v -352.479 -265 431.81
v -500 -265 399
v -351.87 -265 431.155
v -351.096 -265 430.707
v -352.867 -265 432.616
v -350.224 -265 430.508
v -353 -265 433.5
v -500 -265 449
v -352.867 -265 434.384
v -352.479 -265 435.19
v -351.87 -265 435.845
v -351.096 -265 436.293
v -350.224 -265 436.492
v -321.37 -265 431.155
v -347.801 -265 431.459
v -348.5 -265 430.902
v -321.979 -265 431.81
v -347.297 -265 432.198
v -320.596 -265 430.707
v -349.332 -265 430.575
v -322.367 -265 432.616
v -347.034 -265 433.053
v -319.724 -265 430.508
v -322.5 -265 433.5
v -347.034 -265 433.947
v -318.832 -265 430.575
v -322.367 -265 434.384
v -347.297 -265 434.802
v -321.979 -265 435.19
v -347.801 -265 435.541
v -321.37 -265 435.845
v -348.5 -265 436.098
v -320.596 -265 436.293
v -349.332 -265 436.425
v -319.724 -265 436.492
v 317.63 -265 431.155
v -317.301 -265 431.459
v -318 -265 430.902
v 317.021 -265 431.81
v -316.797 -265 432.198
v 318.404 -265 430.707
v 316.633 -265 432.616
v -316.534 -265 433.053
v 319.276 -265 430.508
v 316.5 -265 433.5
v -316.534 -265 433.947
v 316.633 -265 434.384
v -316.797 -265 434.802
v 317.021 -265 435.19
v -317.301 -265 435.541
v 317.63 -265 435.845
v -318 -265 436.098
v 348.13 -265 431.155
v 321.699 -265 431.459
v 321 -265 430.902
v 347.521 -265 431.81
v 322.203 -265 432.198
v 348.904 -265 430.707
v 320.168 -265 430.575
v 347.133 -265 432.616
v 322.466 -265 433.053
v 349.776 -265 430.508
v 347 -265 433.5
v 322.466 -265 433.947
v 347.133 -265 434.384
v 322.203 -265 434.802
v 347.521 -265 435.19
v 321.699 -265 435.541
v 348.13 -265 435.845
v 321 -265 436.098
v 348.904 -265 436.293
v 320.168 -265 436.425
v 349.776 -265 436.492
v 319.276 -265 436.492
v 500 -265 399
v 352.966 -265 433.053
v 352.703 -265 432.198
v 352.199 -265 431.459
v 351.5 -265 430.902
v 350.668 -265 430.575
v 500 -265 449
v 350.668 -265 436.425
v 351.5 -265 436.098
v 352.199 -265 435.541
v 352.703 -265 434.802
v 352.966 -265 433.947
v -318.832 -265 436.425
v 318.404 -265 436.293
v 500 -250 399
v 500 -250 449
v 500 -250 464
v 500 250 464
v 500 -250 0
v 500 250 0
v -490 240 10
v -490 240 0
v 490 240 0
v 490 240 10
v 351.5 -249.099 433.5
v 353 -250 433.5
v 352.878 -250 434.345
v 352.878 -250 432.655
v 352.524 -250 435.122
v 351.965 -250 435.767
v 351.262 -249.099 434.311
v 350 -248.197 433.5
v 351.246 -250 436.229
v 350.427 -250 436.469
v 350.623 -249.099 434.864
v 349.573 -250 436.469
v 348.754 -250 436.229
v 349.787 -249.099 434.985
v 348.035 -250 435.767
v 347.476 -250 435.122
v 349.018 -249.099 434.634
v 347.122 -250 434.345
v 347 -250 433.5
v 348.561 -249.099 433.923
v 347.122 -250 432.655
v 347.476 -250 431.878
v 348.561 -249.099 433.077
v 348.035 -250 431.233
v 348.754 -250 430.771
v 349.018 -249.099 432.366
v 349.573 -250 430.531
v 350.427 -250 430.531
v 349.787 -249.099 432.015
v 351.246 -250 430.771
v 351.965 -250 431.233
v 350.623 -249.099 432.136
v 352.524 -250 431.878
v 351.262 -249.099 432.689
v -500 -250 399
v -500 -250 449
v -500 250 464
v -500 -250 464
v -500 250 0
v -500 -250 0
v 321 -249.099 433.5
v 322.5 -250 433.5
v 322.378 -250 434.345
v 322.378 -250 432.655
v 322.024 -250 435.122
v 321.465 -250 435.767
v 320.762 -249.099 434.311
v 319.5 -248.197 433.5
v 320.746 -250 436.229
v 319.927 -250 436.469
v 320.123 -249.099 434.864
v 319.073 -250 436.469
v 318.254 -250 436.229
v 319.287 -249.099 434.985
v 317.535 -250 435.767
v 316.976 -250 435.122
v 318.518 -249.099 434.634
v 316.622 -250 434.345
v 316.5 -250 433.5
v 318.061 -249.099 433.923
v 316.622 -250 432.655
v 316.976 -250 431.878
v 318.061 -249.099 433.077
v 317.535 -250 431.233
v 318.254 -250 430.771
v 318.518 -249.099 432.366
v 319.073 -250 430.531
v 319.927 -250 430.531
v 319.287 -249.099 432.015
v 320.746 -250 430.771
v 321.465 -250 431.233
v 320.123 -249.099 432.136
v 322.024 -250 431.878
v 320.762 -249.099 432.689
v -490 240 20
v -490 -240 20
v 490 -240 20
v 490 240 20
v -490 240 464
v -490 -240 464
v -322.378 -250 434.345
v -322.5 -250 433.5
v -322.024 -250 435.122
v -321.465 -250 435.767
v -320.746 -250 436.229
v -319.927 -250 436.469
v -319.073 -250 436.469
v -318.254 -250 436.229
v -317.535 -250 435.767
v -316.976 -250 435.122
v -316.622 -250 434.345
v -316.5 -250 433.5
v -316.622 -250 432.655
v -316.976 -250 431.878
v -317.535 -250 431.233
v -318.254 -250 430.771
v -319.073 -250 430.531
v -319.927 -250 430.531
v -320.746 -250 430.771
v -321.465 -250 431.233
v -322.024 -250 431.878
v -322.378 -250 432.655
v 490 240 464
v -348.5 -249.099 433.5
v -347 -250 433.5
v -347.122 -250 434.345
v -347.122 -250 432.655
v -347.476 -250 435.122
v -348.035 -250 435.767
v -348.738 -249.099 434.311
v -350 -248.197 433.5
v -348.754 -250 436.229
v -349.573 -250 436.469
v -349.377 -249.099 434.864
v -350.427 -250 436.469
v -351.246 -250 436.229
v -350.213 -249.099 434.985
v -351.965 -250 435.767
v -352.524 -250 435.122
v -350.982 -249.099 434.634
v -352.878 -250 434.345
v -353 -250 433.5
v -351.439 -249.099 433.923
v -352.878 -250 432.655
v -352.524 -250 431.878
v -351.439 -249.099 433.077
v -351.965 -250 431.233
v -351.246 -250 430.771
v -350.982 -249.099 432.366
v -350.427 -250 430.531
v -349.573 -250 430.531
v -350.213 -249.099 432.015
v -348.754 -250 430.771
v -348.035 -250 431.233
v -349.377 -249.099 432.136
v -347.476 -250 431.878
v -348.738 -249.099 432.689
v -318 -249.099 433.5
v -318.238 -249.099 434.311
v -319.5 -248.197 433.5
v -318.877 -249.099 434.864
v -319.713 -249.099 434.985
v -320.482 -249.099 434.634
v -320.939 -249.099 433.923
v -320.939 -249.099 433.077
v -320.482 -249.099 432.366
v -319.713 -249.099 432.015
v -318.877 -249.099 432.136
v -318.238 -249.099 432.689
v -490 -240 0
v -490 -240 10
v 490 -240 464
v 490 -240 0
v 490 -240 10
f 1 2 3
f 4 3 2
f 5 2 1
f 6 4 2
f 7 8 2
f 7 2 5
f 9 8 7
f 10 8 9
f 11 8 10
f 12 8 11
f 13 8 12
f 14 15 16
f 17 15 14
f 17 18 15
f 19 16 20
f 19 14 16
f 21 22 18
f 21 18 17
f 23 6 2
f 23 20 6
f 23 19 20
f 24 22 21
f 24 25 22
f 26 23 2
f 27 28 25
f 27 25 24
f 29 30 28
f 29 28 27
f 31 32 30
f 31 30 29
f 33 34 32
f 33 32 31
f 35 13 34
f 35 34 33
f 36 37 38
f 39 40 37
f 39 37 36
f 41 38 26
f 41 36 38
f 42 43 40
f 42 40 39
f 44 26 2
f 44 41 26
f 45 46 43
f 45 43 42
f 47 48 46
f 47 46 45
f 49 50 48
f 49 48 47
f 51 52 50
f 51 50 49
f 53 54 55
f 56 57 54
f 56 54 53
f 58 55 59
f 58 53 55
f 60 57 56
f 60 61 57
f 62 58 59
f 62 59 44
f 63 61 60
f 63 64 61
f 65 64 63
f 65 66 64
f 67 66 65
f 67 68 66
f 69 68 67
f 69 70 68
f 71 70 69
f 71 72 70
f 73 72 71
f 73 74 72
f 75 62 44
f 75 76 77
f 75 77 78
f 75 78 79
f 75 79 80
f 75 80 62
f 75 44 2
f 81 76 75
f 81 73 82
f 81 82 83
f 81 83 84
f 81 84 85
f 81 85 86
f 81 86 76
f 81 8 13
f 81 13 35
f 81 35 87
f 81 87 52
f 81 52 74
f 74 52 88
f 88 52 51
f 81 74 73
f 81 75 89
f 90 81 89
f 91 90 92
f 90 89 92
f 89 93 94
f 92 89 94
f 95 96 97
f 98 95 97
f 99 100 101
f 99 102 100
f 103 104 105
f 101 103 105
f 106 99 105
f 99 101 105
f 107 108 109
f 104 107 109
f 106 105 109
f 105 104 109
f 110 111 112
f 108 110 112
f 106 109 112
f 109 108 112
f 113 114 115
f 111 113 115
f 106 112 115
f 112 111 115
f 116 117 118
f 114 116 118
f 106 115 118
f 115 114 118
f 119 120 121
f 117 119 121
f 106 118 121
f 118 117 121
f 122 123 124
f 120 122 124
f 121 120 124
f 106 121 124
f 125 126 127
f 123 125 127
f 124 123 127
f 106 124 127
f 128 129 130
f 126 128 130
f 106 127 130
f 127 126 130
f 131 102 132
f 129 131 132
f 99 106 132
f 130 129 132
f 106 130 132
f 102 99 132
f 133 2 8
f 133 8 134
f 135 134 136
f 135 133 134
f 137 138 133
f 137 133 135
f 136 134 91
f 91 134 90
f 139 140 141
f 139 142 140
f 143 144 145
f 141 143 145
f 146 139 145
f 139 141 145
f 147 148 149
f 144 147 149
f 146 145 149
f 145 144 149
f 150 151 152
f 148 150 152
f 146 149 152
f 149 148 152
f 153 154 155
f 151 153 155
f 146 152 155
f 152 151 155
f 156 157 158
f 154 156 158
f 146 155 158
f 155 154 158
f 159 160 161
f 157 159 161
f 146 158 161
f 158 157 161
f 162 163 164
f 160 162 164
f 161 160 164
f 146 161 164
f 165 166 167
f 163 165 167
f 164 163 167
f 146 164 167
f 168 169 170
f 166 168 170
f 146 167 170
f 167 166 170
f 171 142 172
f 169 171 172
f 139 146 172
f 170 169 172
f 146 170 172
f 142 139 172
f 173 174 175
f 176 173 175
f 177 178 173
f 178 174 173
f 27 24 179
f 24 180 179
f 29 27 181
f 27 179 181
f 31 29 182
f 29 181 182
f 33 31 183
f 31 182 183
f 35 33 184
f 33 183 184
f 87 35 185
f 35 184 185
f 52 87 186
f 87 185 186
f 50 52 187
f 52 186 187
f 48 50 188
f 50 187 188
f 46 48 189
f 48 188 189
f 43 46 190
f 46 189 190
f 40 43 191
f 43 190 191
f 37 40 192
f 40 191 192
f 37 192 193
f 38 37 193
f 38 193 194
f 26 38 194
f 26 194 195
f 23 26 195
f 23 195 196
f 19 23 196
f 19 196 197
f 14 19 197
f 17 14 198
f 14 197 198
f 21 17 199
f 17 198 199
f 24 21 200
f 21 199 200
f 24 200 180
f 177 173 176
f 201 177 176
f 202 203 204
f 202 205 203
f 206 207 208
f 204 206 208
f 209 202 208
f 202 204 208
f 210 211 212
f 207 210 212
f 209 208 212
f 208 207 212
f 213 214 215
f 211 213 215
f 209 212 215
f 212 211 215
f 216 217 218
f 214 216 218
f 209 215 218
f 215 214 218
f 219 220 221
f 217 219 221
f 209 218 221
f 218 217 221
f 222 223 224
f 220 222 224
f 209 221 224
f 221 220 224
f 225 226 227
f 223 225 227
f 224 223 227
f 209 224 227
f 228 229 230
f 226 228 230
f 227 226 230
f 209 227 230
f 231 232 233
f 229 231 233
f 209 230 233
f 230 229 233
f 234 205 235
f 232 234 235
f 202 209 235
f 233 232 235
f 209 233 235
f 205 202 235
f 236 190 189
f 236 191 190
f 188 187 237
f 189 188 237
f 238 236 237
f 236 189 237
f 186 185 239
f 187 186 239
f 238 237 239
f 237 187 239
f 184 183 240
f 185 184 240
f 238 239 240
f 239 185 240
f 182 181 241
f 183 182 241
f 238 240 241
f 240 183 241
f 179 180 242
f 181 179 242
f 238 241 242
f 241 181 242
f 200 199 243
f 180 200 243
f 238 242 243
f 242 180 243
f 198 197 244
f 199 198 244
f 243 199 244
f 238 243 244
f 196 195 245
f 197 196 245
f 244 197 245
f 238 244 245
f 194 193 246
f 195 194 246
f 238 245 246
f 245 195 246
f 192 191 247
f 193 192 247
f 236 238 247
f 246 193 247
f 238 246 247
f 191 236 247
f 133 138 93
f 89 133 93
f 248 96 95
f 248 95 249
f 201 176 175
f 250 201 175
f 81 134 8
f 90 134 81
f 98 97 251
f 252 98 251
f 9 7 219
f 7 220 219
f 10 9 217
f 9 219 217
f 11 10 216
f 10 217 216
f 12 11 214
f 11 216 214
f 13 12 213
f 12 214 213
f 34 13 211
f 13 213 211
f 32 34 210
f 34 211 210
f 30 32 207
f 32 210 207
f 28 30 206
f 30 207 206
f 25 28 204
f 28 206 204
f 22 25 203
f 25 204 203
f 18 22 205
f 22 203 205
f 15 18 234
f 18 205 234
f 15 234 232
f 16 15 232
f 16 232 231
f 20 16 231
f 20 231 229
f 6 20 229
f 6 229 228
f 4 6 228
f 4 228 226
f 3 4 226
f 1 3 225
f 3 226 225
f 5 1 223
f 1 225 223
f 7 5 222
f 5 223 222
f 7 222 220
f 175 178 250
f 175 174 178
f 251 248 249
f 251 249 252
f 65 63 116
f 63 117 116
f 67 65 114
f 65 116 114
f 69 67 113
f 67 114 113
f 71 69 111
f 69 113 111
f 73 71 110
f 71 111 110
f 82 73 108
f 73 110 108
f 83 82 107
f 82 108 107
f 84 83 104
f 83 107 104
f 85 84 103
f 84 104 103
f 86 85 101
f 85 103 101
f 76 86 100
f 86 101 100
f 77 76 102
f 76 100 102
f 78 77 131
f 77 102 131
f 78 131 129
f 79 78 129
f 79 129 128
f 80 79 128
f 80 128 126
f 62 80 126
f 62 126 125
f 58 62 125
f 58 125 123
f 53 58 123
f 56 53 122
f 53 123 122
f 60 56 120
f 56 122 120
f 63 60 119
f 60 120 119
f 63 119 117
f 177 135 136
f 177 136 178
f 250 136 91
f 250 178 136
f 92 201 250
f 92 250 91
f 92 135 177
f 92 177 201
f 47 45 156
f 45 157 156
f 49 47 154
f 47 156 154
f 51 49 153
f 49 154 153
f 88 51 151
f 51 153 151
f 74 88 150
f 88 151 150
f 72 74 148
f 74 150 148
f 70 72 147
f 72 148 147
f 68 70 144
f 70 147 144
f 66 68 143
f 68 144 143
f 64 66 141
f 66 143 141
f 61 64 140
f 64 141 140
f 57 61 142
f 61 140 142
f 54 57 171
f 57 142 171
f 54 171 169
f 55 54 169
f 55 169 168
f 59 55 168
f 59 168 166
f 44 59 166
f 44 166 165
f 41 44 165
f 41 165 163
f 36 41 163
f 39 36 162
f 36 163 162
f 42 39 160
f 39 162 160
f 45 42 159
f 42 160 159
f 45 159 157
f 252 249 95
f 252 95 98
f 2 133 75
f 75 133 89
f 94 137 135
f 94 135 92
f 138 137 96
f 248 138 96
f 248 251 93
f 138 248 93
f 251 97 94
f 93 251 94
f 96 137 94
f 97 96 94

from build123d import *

# Parameters (mm, degrees)
F0_W     = 1000
F0_H     = 500
F1_DEPTH = 464
F2_W     = 980
F2_H     = 480
F3_DEPTH = 10
F4_T     = -10
F5_W     = 1000
F5_H     = 50
F6_DEPTH = 15
F8_D     = 6
F8_DEPTH = 15
F8_TIP   = 1.8025818571


# Not quite as in the source:
# - a shell that OpenCascade refuses in one call is made with other operations: the cavity is built on its own and cut out


with BuildPart() as f1:
    # F0 (on Top) → F1 (new body)
    with BuildSketch(Plane.XY):
        Rectangle(F0_W, F0_H)
    extrude(amount=F1_DEPTH)

    # F2 (on face) → F3 (cut)
    with BuildSketch(Plane(origin=(0, 0, 0), x_dir=(1, 0, 0), z_dir=(0, 0, -1))):
        Rectangle(F2_W, F2_H)
    extrude(amount=-F3_DEPTH, mode=Mode.SUBTRACT)

    # F4: a shell. OpenCascade refuses it in one call, so the cavity is built on its own and cut out:
    # the body offset inwards by the wall thickness, plus a prism from it out through each open face.
    f4_core = offset(f1.part, amount=F4_T, kind=Kind.INTERSECTION, mode=Mode.PRIVATE)
    f4_exits = [f4_core.faces().sort_by_distance(p)[0] for p in [
        (0, 0, 454),
    ]]
    add(f4_core, mode=Mode.SUBTRACT)
    extrude(f4_exits, amount=-F4_T, mode=Mode.SUBTRACT)

    # F5 (on face) → F6 (join)
    with BuildSketch(Plane.XZ.offset(250)):
        with Locations((0, 424)):
            Rectangle(F5_W, F5_H)
    extrude(amount=F6_DEPTH)

    # F8
    with Locations(Plane.XZ.offset(265)):
        with Locations((-350, 433.5), (-319.5, 433.5), (319.5, 433.5), (350, 433.5)):
            Hole(F8_D / 2, depth=F8_DEPTH)
            with Locations((0, 0, -(F8_DEPTH + F8_TIP / 2))):  # 118° drill point
                Cone(0, F8_D / 2, F8_TIP, mode=Mode.SUBTRACT)


solid = f1.part
